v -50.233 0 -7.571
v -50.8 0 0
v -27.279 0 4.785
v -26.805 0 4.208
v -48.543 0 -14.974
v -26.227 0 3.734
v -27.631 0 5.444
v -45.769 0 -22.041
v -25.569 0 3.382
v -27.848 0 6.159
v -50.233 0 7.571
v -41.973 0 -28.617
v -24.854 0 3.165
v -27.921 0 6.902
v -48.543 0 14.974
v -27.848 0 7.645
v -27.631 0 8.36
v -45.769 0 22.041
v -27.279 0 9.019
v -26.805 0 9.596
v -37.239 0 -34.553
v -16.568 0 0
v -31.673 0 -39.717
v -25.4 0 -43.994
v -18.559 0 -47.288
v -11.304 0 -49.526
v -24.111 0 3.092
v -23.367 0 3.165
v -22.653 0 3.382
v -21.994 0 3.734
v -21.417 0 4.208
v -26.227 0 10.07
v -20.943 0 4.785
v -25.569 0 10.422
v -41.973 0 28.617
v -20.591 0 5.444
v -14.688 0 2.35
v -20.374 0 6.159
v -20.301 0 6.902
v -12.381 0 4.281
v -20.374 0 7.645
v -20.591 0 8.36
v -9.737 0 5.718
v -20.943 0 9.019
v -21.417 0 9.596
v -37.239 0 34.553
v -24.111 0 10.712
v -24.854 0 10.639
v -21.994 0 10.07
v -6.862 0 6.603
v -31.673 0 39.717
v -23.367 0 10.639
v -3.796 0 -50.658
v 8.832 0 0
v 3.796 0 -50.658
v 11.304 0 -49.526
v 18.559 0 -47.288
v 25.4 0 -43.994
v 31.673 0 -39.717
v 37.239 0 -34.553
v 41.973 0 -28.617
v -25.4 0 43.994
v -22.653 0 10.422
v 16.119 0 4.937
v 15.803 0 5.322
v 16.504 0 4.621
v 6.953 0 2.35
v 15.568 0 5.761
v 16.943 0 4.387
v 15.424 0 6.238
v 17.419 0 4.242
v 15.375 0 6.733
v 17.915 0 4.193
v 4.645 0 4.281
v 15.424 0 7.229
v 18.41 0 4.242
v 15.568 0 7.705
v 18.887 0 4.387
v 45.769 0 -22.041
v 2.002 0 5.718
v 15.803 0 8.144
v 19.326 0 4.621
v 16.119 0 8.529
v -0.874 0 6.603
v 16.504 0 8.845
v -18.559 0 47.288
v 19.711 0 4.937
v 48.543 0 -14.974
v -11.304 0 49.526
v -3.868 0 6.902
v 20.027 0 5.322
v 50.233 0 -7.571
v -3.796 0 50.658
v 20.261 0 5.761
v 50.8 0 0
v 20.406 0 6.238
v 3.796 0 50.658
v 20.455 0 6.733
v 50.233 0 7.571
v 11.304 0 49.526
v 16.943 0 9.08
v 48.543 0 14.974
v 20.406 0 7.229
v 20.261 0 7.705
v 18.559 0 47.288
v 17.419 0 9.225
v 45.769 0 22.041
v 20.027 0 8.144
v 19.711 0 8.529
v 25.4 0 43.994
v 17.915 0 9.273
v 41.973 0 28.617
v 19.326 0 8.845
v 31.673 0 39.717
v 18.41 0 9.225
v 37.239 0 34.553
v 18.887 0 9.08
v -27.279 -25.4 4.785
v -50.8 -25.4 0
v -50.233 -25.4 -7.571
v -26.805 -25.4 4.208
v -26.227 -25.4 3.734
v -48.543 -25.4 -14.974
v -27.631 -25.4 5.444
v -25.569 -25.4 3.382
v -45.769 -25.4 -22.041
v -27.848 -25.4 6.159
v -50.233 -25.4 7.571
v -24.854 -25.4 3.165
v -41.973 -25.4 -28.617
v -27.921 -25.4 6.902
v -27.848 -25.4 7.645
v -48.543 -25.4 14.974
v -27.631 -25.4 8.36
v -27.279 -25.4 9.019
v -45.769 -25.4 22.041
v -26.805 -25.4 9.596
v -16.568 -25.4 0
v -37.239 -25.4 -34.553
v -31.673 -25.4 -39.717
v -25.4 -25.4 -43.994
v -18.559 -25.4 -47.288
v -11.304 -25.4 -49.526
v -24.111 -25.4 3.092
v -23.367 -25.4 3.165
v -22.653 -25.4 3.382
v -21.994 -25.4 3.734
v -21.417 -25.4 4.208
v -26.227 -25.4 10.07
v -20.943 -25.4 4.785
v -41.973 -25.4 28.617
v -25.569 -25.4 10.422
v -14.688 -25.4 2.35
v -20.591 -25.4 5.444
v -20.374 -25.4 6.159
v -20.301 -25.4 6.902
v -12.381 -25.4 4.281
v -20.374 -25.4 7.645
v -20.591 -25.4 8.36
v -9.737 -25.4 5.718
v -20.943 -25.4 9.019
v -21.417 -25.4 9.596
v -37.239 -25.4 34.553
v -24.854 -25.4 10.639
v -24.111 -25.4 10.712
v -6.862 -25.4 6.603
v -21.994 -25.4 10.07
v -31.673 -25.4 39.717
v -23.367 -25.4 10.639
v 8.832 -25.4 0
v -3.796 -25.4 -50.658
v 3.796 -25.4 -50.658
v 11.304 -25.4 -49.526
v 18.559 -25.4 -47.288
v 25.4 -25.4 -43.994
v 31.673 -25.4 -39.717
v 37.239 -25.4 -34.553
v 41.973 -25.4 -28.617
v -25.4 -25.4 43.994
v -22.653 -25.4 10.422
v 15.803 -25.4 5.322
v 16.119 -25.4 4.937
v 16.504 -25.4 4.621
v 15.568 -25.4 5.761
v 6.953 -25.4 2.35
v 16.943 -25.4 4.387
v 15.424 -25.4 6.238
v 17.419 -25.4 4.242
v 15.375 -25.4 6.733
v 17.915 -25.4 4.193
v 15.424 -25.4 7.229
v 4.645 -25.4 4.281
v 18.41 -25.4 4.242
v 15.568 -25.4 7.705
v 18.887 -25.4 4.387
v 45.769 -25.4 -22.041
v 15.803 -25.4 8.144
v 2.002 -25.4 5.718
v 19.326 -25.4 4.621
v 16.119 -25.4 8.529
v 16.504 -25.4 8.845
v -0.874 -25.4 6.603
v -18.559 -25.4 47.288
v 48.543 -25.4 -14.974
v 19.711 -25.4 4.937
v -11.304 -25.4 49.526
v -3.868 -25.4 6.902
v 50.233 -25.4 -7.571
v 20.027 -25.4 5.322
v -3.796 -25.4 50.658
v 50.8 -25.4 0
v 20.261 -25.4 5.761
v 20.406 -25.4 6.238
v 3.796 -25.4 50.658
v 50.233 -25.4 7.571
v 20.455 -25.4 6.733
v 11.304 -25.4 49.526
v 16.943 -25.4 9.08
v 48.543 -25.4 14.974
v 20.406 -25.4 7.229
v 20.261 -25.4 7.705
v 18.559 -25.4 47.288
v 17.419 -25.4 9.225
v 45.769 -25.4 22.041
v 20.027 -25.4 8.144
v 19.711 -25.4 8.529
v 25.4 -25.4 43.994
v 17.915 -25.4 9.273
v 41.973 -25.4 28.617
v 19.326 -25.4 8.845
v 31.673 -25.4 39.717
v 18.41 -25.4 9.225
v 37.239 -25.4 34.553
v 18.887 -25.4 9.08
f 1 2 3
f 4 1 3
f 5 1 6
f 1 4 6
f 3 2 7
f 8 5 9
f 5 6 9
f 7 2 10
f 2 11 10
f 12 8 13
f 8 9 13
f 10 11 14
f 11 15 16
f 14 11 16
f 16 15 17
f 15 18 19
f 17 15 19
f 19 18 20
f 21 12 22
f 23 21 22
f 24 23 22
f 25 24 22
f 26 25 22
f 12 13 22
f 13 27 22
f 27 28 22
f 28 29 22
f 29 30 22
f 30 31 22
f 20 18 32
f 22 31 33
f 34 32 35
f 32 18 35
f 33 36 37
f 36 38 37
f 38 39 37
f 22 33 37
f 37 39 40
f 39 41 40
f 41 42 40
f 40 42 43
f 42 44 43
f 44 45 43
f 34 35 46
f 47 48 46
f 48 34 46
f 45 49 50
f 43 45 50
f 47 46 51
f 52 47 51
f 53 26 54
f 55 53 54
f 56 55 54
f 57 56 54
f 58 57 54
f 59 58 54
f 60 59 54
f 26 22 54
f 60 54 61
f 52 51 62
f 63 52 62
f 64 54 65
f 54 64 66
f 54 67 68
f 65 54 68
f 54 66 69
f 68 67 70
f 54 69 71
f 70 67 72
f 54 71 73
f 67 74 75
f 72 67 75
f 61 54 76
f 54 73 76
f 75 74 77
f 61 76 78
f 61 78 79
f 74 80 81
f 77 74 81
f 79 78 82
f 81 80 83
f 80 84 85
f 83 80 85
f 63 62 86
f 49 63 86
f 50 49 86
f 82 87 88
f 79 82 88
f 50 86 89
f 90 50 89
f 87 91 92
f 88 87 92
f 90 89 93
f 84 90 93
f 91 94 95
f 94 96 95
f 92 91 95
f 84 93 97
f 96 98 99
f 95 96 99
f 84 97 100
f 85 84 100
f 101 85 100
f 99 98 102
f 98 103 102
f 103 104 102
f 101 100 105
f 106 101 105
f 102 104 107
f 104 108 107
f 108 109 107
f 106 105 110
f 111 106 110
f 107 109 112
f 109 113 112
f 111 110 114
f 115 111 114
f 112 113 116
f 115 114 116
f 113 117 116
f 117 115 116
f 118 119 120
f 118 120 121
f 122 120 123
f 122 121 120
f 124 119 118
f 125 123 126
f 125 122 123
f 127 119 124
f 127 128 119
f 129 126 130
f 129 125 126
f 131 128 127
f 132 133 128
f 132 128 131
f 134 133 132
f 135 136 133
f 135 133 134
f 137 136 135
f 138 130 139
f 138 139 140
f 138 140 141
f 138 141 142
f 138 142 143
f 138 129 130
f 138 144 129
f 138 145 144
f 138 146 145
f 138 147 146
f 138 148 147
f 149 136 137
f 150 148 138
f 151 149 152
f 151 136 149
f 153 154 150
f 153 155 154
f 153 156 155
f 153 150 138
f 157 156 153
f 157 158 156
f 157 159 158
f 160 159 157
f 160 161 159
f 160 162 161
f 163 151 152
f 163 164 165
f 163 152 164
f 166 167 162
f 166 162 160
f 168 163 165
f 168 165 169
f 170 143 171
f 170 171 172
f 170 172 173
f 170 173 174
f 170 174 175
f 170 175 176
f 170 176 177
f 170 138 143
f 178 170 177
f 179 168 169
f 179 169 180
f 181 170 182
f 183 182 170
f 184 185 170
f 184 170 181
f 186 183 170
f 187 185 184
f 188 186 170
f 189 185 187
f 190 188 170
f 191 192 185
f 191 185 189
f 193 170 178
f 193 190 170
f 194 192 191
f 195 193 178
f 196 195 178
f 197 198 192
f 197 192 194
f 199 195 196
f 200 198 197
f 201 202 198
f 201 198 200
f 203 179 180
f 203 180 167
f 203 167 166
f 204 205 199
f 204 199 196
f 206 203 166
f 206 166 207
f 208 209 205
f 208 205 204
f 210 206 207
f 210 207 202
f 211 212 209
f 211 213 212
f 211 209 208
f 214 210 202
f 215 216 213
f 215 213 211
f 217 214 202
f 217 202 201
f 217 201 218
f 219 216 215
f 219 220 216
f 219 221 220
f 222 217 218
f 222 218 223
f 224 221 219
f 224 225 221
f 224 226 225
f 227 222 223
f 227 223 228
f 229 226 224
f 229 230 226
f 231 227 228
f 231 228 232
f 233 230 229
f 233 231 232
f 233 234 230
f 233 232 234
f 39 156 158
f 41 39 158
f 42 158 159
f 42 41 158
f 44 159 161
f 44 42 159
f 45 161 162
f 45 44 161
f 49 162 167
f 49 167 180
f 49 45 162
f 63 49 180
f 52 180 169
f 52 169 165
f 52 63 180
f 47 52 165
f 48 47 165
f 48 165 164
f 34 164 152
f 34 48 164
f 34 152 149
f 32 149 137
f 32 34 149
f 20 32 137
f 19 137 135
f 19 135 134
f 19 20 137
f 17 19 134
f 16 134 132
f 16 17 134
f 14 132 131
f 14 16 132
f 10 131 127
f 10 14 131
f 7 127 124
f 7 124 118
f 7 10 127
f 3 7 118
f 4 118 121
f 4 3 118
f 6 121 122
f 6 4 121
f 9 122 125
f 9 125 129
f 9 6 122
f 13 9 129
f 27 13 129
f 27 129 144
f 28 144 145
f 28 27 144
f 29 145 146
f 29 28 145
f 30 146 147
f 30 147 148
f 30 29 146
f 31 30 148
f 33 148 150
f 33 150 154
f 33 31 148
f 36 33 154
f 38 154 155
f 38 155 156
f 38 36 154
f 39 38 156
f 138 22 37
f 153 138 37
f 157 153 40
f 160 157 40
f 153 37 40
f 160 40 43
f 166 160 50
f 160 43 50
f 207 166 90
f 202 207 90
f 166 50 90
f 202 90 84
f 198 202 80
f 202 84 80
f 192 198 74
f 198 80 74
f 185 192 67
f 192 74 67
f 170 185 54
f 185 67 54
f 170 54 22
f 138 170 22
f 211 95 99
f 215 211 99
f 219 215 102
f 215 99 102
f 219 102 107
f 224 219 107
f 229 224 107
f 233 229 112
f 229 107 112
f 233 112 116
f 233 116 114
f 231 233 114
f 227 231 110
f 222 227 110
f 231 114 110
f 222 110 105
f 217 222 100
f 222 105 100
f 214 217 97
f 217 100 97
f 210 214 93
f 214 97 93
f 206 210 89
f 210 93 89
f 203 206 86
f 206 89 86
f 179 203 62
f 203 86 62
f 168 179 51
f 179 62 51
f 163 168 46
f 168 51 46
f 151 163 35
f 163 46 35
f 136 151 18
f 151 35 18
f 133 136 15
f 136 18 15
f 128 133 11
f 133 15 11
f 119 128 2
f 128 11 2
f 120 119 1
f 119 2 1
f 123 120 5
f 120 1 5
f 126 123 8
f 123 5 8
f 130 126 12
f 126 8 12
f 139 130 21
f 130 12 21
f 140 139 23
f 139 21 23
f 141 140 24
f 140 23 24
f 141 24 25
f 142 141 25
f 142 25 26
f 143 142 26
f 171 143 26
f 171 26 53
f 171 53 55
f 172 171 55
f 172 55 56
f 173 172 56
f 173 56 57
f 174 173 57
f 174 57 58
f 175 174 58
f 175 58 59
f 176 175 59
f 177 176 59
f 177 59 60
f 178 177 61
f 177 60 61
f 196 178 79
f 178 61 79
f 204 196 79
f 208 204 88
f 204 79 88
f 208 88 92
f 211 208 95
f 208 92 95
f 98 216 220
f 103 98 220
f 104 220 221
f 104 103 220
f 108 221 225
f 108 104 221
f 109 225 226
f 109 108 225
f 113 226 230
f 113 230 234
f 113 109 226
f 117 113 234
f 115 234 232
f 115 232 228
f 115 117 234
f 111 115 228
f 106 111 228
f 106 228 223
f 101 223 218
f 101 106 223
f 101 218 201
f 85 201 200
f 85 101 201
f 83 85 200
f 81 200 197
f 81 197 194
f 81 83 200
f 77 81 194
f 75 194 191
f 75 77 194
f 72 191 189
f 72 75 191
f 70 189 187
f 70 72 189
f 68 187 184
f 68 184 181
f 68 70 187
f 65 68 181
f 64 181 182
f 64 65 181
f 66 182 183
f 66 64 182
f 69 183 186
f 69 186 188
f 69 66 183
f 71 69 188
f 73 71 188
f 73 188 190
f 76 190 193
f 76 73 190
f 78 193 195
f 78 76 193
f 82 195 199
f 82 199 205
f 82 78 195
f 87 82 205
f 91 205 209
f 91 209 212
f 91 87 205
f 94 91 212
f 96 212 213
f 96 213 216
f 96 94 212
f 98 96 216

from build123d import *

# Parameters (mm, degrees)
F0_R     = 50.8
F0_R_2   = 3.81
F0_R_3   = 2.54
F1_DEPTH = 25.4


with BuildPart() as f1:
    # F0 (on Front) → F1 (new body)
    with BuildSketch(Plane.XZ):
        Circle(F0_R)
        with Locations((-24.110759, 6.902)):
            Circle(F0_R_2, mode=Mode.SUBTRACT)
        with BuildLine():
            Line((8.832272, 0), (-16.567728, 0))
            ThreePointArc((-16.567728, 0), (-3.867728, 6.902), (8.832272, 0))
        make_face(mode=Mode.SUBTRACT)
        with Locations((17.914698, 6.733317)):
            Circle(F0_R_3, mode=Mode.SUBTRACT)
    extrude(amount=F1_DEPTH)


solid = f1.part
